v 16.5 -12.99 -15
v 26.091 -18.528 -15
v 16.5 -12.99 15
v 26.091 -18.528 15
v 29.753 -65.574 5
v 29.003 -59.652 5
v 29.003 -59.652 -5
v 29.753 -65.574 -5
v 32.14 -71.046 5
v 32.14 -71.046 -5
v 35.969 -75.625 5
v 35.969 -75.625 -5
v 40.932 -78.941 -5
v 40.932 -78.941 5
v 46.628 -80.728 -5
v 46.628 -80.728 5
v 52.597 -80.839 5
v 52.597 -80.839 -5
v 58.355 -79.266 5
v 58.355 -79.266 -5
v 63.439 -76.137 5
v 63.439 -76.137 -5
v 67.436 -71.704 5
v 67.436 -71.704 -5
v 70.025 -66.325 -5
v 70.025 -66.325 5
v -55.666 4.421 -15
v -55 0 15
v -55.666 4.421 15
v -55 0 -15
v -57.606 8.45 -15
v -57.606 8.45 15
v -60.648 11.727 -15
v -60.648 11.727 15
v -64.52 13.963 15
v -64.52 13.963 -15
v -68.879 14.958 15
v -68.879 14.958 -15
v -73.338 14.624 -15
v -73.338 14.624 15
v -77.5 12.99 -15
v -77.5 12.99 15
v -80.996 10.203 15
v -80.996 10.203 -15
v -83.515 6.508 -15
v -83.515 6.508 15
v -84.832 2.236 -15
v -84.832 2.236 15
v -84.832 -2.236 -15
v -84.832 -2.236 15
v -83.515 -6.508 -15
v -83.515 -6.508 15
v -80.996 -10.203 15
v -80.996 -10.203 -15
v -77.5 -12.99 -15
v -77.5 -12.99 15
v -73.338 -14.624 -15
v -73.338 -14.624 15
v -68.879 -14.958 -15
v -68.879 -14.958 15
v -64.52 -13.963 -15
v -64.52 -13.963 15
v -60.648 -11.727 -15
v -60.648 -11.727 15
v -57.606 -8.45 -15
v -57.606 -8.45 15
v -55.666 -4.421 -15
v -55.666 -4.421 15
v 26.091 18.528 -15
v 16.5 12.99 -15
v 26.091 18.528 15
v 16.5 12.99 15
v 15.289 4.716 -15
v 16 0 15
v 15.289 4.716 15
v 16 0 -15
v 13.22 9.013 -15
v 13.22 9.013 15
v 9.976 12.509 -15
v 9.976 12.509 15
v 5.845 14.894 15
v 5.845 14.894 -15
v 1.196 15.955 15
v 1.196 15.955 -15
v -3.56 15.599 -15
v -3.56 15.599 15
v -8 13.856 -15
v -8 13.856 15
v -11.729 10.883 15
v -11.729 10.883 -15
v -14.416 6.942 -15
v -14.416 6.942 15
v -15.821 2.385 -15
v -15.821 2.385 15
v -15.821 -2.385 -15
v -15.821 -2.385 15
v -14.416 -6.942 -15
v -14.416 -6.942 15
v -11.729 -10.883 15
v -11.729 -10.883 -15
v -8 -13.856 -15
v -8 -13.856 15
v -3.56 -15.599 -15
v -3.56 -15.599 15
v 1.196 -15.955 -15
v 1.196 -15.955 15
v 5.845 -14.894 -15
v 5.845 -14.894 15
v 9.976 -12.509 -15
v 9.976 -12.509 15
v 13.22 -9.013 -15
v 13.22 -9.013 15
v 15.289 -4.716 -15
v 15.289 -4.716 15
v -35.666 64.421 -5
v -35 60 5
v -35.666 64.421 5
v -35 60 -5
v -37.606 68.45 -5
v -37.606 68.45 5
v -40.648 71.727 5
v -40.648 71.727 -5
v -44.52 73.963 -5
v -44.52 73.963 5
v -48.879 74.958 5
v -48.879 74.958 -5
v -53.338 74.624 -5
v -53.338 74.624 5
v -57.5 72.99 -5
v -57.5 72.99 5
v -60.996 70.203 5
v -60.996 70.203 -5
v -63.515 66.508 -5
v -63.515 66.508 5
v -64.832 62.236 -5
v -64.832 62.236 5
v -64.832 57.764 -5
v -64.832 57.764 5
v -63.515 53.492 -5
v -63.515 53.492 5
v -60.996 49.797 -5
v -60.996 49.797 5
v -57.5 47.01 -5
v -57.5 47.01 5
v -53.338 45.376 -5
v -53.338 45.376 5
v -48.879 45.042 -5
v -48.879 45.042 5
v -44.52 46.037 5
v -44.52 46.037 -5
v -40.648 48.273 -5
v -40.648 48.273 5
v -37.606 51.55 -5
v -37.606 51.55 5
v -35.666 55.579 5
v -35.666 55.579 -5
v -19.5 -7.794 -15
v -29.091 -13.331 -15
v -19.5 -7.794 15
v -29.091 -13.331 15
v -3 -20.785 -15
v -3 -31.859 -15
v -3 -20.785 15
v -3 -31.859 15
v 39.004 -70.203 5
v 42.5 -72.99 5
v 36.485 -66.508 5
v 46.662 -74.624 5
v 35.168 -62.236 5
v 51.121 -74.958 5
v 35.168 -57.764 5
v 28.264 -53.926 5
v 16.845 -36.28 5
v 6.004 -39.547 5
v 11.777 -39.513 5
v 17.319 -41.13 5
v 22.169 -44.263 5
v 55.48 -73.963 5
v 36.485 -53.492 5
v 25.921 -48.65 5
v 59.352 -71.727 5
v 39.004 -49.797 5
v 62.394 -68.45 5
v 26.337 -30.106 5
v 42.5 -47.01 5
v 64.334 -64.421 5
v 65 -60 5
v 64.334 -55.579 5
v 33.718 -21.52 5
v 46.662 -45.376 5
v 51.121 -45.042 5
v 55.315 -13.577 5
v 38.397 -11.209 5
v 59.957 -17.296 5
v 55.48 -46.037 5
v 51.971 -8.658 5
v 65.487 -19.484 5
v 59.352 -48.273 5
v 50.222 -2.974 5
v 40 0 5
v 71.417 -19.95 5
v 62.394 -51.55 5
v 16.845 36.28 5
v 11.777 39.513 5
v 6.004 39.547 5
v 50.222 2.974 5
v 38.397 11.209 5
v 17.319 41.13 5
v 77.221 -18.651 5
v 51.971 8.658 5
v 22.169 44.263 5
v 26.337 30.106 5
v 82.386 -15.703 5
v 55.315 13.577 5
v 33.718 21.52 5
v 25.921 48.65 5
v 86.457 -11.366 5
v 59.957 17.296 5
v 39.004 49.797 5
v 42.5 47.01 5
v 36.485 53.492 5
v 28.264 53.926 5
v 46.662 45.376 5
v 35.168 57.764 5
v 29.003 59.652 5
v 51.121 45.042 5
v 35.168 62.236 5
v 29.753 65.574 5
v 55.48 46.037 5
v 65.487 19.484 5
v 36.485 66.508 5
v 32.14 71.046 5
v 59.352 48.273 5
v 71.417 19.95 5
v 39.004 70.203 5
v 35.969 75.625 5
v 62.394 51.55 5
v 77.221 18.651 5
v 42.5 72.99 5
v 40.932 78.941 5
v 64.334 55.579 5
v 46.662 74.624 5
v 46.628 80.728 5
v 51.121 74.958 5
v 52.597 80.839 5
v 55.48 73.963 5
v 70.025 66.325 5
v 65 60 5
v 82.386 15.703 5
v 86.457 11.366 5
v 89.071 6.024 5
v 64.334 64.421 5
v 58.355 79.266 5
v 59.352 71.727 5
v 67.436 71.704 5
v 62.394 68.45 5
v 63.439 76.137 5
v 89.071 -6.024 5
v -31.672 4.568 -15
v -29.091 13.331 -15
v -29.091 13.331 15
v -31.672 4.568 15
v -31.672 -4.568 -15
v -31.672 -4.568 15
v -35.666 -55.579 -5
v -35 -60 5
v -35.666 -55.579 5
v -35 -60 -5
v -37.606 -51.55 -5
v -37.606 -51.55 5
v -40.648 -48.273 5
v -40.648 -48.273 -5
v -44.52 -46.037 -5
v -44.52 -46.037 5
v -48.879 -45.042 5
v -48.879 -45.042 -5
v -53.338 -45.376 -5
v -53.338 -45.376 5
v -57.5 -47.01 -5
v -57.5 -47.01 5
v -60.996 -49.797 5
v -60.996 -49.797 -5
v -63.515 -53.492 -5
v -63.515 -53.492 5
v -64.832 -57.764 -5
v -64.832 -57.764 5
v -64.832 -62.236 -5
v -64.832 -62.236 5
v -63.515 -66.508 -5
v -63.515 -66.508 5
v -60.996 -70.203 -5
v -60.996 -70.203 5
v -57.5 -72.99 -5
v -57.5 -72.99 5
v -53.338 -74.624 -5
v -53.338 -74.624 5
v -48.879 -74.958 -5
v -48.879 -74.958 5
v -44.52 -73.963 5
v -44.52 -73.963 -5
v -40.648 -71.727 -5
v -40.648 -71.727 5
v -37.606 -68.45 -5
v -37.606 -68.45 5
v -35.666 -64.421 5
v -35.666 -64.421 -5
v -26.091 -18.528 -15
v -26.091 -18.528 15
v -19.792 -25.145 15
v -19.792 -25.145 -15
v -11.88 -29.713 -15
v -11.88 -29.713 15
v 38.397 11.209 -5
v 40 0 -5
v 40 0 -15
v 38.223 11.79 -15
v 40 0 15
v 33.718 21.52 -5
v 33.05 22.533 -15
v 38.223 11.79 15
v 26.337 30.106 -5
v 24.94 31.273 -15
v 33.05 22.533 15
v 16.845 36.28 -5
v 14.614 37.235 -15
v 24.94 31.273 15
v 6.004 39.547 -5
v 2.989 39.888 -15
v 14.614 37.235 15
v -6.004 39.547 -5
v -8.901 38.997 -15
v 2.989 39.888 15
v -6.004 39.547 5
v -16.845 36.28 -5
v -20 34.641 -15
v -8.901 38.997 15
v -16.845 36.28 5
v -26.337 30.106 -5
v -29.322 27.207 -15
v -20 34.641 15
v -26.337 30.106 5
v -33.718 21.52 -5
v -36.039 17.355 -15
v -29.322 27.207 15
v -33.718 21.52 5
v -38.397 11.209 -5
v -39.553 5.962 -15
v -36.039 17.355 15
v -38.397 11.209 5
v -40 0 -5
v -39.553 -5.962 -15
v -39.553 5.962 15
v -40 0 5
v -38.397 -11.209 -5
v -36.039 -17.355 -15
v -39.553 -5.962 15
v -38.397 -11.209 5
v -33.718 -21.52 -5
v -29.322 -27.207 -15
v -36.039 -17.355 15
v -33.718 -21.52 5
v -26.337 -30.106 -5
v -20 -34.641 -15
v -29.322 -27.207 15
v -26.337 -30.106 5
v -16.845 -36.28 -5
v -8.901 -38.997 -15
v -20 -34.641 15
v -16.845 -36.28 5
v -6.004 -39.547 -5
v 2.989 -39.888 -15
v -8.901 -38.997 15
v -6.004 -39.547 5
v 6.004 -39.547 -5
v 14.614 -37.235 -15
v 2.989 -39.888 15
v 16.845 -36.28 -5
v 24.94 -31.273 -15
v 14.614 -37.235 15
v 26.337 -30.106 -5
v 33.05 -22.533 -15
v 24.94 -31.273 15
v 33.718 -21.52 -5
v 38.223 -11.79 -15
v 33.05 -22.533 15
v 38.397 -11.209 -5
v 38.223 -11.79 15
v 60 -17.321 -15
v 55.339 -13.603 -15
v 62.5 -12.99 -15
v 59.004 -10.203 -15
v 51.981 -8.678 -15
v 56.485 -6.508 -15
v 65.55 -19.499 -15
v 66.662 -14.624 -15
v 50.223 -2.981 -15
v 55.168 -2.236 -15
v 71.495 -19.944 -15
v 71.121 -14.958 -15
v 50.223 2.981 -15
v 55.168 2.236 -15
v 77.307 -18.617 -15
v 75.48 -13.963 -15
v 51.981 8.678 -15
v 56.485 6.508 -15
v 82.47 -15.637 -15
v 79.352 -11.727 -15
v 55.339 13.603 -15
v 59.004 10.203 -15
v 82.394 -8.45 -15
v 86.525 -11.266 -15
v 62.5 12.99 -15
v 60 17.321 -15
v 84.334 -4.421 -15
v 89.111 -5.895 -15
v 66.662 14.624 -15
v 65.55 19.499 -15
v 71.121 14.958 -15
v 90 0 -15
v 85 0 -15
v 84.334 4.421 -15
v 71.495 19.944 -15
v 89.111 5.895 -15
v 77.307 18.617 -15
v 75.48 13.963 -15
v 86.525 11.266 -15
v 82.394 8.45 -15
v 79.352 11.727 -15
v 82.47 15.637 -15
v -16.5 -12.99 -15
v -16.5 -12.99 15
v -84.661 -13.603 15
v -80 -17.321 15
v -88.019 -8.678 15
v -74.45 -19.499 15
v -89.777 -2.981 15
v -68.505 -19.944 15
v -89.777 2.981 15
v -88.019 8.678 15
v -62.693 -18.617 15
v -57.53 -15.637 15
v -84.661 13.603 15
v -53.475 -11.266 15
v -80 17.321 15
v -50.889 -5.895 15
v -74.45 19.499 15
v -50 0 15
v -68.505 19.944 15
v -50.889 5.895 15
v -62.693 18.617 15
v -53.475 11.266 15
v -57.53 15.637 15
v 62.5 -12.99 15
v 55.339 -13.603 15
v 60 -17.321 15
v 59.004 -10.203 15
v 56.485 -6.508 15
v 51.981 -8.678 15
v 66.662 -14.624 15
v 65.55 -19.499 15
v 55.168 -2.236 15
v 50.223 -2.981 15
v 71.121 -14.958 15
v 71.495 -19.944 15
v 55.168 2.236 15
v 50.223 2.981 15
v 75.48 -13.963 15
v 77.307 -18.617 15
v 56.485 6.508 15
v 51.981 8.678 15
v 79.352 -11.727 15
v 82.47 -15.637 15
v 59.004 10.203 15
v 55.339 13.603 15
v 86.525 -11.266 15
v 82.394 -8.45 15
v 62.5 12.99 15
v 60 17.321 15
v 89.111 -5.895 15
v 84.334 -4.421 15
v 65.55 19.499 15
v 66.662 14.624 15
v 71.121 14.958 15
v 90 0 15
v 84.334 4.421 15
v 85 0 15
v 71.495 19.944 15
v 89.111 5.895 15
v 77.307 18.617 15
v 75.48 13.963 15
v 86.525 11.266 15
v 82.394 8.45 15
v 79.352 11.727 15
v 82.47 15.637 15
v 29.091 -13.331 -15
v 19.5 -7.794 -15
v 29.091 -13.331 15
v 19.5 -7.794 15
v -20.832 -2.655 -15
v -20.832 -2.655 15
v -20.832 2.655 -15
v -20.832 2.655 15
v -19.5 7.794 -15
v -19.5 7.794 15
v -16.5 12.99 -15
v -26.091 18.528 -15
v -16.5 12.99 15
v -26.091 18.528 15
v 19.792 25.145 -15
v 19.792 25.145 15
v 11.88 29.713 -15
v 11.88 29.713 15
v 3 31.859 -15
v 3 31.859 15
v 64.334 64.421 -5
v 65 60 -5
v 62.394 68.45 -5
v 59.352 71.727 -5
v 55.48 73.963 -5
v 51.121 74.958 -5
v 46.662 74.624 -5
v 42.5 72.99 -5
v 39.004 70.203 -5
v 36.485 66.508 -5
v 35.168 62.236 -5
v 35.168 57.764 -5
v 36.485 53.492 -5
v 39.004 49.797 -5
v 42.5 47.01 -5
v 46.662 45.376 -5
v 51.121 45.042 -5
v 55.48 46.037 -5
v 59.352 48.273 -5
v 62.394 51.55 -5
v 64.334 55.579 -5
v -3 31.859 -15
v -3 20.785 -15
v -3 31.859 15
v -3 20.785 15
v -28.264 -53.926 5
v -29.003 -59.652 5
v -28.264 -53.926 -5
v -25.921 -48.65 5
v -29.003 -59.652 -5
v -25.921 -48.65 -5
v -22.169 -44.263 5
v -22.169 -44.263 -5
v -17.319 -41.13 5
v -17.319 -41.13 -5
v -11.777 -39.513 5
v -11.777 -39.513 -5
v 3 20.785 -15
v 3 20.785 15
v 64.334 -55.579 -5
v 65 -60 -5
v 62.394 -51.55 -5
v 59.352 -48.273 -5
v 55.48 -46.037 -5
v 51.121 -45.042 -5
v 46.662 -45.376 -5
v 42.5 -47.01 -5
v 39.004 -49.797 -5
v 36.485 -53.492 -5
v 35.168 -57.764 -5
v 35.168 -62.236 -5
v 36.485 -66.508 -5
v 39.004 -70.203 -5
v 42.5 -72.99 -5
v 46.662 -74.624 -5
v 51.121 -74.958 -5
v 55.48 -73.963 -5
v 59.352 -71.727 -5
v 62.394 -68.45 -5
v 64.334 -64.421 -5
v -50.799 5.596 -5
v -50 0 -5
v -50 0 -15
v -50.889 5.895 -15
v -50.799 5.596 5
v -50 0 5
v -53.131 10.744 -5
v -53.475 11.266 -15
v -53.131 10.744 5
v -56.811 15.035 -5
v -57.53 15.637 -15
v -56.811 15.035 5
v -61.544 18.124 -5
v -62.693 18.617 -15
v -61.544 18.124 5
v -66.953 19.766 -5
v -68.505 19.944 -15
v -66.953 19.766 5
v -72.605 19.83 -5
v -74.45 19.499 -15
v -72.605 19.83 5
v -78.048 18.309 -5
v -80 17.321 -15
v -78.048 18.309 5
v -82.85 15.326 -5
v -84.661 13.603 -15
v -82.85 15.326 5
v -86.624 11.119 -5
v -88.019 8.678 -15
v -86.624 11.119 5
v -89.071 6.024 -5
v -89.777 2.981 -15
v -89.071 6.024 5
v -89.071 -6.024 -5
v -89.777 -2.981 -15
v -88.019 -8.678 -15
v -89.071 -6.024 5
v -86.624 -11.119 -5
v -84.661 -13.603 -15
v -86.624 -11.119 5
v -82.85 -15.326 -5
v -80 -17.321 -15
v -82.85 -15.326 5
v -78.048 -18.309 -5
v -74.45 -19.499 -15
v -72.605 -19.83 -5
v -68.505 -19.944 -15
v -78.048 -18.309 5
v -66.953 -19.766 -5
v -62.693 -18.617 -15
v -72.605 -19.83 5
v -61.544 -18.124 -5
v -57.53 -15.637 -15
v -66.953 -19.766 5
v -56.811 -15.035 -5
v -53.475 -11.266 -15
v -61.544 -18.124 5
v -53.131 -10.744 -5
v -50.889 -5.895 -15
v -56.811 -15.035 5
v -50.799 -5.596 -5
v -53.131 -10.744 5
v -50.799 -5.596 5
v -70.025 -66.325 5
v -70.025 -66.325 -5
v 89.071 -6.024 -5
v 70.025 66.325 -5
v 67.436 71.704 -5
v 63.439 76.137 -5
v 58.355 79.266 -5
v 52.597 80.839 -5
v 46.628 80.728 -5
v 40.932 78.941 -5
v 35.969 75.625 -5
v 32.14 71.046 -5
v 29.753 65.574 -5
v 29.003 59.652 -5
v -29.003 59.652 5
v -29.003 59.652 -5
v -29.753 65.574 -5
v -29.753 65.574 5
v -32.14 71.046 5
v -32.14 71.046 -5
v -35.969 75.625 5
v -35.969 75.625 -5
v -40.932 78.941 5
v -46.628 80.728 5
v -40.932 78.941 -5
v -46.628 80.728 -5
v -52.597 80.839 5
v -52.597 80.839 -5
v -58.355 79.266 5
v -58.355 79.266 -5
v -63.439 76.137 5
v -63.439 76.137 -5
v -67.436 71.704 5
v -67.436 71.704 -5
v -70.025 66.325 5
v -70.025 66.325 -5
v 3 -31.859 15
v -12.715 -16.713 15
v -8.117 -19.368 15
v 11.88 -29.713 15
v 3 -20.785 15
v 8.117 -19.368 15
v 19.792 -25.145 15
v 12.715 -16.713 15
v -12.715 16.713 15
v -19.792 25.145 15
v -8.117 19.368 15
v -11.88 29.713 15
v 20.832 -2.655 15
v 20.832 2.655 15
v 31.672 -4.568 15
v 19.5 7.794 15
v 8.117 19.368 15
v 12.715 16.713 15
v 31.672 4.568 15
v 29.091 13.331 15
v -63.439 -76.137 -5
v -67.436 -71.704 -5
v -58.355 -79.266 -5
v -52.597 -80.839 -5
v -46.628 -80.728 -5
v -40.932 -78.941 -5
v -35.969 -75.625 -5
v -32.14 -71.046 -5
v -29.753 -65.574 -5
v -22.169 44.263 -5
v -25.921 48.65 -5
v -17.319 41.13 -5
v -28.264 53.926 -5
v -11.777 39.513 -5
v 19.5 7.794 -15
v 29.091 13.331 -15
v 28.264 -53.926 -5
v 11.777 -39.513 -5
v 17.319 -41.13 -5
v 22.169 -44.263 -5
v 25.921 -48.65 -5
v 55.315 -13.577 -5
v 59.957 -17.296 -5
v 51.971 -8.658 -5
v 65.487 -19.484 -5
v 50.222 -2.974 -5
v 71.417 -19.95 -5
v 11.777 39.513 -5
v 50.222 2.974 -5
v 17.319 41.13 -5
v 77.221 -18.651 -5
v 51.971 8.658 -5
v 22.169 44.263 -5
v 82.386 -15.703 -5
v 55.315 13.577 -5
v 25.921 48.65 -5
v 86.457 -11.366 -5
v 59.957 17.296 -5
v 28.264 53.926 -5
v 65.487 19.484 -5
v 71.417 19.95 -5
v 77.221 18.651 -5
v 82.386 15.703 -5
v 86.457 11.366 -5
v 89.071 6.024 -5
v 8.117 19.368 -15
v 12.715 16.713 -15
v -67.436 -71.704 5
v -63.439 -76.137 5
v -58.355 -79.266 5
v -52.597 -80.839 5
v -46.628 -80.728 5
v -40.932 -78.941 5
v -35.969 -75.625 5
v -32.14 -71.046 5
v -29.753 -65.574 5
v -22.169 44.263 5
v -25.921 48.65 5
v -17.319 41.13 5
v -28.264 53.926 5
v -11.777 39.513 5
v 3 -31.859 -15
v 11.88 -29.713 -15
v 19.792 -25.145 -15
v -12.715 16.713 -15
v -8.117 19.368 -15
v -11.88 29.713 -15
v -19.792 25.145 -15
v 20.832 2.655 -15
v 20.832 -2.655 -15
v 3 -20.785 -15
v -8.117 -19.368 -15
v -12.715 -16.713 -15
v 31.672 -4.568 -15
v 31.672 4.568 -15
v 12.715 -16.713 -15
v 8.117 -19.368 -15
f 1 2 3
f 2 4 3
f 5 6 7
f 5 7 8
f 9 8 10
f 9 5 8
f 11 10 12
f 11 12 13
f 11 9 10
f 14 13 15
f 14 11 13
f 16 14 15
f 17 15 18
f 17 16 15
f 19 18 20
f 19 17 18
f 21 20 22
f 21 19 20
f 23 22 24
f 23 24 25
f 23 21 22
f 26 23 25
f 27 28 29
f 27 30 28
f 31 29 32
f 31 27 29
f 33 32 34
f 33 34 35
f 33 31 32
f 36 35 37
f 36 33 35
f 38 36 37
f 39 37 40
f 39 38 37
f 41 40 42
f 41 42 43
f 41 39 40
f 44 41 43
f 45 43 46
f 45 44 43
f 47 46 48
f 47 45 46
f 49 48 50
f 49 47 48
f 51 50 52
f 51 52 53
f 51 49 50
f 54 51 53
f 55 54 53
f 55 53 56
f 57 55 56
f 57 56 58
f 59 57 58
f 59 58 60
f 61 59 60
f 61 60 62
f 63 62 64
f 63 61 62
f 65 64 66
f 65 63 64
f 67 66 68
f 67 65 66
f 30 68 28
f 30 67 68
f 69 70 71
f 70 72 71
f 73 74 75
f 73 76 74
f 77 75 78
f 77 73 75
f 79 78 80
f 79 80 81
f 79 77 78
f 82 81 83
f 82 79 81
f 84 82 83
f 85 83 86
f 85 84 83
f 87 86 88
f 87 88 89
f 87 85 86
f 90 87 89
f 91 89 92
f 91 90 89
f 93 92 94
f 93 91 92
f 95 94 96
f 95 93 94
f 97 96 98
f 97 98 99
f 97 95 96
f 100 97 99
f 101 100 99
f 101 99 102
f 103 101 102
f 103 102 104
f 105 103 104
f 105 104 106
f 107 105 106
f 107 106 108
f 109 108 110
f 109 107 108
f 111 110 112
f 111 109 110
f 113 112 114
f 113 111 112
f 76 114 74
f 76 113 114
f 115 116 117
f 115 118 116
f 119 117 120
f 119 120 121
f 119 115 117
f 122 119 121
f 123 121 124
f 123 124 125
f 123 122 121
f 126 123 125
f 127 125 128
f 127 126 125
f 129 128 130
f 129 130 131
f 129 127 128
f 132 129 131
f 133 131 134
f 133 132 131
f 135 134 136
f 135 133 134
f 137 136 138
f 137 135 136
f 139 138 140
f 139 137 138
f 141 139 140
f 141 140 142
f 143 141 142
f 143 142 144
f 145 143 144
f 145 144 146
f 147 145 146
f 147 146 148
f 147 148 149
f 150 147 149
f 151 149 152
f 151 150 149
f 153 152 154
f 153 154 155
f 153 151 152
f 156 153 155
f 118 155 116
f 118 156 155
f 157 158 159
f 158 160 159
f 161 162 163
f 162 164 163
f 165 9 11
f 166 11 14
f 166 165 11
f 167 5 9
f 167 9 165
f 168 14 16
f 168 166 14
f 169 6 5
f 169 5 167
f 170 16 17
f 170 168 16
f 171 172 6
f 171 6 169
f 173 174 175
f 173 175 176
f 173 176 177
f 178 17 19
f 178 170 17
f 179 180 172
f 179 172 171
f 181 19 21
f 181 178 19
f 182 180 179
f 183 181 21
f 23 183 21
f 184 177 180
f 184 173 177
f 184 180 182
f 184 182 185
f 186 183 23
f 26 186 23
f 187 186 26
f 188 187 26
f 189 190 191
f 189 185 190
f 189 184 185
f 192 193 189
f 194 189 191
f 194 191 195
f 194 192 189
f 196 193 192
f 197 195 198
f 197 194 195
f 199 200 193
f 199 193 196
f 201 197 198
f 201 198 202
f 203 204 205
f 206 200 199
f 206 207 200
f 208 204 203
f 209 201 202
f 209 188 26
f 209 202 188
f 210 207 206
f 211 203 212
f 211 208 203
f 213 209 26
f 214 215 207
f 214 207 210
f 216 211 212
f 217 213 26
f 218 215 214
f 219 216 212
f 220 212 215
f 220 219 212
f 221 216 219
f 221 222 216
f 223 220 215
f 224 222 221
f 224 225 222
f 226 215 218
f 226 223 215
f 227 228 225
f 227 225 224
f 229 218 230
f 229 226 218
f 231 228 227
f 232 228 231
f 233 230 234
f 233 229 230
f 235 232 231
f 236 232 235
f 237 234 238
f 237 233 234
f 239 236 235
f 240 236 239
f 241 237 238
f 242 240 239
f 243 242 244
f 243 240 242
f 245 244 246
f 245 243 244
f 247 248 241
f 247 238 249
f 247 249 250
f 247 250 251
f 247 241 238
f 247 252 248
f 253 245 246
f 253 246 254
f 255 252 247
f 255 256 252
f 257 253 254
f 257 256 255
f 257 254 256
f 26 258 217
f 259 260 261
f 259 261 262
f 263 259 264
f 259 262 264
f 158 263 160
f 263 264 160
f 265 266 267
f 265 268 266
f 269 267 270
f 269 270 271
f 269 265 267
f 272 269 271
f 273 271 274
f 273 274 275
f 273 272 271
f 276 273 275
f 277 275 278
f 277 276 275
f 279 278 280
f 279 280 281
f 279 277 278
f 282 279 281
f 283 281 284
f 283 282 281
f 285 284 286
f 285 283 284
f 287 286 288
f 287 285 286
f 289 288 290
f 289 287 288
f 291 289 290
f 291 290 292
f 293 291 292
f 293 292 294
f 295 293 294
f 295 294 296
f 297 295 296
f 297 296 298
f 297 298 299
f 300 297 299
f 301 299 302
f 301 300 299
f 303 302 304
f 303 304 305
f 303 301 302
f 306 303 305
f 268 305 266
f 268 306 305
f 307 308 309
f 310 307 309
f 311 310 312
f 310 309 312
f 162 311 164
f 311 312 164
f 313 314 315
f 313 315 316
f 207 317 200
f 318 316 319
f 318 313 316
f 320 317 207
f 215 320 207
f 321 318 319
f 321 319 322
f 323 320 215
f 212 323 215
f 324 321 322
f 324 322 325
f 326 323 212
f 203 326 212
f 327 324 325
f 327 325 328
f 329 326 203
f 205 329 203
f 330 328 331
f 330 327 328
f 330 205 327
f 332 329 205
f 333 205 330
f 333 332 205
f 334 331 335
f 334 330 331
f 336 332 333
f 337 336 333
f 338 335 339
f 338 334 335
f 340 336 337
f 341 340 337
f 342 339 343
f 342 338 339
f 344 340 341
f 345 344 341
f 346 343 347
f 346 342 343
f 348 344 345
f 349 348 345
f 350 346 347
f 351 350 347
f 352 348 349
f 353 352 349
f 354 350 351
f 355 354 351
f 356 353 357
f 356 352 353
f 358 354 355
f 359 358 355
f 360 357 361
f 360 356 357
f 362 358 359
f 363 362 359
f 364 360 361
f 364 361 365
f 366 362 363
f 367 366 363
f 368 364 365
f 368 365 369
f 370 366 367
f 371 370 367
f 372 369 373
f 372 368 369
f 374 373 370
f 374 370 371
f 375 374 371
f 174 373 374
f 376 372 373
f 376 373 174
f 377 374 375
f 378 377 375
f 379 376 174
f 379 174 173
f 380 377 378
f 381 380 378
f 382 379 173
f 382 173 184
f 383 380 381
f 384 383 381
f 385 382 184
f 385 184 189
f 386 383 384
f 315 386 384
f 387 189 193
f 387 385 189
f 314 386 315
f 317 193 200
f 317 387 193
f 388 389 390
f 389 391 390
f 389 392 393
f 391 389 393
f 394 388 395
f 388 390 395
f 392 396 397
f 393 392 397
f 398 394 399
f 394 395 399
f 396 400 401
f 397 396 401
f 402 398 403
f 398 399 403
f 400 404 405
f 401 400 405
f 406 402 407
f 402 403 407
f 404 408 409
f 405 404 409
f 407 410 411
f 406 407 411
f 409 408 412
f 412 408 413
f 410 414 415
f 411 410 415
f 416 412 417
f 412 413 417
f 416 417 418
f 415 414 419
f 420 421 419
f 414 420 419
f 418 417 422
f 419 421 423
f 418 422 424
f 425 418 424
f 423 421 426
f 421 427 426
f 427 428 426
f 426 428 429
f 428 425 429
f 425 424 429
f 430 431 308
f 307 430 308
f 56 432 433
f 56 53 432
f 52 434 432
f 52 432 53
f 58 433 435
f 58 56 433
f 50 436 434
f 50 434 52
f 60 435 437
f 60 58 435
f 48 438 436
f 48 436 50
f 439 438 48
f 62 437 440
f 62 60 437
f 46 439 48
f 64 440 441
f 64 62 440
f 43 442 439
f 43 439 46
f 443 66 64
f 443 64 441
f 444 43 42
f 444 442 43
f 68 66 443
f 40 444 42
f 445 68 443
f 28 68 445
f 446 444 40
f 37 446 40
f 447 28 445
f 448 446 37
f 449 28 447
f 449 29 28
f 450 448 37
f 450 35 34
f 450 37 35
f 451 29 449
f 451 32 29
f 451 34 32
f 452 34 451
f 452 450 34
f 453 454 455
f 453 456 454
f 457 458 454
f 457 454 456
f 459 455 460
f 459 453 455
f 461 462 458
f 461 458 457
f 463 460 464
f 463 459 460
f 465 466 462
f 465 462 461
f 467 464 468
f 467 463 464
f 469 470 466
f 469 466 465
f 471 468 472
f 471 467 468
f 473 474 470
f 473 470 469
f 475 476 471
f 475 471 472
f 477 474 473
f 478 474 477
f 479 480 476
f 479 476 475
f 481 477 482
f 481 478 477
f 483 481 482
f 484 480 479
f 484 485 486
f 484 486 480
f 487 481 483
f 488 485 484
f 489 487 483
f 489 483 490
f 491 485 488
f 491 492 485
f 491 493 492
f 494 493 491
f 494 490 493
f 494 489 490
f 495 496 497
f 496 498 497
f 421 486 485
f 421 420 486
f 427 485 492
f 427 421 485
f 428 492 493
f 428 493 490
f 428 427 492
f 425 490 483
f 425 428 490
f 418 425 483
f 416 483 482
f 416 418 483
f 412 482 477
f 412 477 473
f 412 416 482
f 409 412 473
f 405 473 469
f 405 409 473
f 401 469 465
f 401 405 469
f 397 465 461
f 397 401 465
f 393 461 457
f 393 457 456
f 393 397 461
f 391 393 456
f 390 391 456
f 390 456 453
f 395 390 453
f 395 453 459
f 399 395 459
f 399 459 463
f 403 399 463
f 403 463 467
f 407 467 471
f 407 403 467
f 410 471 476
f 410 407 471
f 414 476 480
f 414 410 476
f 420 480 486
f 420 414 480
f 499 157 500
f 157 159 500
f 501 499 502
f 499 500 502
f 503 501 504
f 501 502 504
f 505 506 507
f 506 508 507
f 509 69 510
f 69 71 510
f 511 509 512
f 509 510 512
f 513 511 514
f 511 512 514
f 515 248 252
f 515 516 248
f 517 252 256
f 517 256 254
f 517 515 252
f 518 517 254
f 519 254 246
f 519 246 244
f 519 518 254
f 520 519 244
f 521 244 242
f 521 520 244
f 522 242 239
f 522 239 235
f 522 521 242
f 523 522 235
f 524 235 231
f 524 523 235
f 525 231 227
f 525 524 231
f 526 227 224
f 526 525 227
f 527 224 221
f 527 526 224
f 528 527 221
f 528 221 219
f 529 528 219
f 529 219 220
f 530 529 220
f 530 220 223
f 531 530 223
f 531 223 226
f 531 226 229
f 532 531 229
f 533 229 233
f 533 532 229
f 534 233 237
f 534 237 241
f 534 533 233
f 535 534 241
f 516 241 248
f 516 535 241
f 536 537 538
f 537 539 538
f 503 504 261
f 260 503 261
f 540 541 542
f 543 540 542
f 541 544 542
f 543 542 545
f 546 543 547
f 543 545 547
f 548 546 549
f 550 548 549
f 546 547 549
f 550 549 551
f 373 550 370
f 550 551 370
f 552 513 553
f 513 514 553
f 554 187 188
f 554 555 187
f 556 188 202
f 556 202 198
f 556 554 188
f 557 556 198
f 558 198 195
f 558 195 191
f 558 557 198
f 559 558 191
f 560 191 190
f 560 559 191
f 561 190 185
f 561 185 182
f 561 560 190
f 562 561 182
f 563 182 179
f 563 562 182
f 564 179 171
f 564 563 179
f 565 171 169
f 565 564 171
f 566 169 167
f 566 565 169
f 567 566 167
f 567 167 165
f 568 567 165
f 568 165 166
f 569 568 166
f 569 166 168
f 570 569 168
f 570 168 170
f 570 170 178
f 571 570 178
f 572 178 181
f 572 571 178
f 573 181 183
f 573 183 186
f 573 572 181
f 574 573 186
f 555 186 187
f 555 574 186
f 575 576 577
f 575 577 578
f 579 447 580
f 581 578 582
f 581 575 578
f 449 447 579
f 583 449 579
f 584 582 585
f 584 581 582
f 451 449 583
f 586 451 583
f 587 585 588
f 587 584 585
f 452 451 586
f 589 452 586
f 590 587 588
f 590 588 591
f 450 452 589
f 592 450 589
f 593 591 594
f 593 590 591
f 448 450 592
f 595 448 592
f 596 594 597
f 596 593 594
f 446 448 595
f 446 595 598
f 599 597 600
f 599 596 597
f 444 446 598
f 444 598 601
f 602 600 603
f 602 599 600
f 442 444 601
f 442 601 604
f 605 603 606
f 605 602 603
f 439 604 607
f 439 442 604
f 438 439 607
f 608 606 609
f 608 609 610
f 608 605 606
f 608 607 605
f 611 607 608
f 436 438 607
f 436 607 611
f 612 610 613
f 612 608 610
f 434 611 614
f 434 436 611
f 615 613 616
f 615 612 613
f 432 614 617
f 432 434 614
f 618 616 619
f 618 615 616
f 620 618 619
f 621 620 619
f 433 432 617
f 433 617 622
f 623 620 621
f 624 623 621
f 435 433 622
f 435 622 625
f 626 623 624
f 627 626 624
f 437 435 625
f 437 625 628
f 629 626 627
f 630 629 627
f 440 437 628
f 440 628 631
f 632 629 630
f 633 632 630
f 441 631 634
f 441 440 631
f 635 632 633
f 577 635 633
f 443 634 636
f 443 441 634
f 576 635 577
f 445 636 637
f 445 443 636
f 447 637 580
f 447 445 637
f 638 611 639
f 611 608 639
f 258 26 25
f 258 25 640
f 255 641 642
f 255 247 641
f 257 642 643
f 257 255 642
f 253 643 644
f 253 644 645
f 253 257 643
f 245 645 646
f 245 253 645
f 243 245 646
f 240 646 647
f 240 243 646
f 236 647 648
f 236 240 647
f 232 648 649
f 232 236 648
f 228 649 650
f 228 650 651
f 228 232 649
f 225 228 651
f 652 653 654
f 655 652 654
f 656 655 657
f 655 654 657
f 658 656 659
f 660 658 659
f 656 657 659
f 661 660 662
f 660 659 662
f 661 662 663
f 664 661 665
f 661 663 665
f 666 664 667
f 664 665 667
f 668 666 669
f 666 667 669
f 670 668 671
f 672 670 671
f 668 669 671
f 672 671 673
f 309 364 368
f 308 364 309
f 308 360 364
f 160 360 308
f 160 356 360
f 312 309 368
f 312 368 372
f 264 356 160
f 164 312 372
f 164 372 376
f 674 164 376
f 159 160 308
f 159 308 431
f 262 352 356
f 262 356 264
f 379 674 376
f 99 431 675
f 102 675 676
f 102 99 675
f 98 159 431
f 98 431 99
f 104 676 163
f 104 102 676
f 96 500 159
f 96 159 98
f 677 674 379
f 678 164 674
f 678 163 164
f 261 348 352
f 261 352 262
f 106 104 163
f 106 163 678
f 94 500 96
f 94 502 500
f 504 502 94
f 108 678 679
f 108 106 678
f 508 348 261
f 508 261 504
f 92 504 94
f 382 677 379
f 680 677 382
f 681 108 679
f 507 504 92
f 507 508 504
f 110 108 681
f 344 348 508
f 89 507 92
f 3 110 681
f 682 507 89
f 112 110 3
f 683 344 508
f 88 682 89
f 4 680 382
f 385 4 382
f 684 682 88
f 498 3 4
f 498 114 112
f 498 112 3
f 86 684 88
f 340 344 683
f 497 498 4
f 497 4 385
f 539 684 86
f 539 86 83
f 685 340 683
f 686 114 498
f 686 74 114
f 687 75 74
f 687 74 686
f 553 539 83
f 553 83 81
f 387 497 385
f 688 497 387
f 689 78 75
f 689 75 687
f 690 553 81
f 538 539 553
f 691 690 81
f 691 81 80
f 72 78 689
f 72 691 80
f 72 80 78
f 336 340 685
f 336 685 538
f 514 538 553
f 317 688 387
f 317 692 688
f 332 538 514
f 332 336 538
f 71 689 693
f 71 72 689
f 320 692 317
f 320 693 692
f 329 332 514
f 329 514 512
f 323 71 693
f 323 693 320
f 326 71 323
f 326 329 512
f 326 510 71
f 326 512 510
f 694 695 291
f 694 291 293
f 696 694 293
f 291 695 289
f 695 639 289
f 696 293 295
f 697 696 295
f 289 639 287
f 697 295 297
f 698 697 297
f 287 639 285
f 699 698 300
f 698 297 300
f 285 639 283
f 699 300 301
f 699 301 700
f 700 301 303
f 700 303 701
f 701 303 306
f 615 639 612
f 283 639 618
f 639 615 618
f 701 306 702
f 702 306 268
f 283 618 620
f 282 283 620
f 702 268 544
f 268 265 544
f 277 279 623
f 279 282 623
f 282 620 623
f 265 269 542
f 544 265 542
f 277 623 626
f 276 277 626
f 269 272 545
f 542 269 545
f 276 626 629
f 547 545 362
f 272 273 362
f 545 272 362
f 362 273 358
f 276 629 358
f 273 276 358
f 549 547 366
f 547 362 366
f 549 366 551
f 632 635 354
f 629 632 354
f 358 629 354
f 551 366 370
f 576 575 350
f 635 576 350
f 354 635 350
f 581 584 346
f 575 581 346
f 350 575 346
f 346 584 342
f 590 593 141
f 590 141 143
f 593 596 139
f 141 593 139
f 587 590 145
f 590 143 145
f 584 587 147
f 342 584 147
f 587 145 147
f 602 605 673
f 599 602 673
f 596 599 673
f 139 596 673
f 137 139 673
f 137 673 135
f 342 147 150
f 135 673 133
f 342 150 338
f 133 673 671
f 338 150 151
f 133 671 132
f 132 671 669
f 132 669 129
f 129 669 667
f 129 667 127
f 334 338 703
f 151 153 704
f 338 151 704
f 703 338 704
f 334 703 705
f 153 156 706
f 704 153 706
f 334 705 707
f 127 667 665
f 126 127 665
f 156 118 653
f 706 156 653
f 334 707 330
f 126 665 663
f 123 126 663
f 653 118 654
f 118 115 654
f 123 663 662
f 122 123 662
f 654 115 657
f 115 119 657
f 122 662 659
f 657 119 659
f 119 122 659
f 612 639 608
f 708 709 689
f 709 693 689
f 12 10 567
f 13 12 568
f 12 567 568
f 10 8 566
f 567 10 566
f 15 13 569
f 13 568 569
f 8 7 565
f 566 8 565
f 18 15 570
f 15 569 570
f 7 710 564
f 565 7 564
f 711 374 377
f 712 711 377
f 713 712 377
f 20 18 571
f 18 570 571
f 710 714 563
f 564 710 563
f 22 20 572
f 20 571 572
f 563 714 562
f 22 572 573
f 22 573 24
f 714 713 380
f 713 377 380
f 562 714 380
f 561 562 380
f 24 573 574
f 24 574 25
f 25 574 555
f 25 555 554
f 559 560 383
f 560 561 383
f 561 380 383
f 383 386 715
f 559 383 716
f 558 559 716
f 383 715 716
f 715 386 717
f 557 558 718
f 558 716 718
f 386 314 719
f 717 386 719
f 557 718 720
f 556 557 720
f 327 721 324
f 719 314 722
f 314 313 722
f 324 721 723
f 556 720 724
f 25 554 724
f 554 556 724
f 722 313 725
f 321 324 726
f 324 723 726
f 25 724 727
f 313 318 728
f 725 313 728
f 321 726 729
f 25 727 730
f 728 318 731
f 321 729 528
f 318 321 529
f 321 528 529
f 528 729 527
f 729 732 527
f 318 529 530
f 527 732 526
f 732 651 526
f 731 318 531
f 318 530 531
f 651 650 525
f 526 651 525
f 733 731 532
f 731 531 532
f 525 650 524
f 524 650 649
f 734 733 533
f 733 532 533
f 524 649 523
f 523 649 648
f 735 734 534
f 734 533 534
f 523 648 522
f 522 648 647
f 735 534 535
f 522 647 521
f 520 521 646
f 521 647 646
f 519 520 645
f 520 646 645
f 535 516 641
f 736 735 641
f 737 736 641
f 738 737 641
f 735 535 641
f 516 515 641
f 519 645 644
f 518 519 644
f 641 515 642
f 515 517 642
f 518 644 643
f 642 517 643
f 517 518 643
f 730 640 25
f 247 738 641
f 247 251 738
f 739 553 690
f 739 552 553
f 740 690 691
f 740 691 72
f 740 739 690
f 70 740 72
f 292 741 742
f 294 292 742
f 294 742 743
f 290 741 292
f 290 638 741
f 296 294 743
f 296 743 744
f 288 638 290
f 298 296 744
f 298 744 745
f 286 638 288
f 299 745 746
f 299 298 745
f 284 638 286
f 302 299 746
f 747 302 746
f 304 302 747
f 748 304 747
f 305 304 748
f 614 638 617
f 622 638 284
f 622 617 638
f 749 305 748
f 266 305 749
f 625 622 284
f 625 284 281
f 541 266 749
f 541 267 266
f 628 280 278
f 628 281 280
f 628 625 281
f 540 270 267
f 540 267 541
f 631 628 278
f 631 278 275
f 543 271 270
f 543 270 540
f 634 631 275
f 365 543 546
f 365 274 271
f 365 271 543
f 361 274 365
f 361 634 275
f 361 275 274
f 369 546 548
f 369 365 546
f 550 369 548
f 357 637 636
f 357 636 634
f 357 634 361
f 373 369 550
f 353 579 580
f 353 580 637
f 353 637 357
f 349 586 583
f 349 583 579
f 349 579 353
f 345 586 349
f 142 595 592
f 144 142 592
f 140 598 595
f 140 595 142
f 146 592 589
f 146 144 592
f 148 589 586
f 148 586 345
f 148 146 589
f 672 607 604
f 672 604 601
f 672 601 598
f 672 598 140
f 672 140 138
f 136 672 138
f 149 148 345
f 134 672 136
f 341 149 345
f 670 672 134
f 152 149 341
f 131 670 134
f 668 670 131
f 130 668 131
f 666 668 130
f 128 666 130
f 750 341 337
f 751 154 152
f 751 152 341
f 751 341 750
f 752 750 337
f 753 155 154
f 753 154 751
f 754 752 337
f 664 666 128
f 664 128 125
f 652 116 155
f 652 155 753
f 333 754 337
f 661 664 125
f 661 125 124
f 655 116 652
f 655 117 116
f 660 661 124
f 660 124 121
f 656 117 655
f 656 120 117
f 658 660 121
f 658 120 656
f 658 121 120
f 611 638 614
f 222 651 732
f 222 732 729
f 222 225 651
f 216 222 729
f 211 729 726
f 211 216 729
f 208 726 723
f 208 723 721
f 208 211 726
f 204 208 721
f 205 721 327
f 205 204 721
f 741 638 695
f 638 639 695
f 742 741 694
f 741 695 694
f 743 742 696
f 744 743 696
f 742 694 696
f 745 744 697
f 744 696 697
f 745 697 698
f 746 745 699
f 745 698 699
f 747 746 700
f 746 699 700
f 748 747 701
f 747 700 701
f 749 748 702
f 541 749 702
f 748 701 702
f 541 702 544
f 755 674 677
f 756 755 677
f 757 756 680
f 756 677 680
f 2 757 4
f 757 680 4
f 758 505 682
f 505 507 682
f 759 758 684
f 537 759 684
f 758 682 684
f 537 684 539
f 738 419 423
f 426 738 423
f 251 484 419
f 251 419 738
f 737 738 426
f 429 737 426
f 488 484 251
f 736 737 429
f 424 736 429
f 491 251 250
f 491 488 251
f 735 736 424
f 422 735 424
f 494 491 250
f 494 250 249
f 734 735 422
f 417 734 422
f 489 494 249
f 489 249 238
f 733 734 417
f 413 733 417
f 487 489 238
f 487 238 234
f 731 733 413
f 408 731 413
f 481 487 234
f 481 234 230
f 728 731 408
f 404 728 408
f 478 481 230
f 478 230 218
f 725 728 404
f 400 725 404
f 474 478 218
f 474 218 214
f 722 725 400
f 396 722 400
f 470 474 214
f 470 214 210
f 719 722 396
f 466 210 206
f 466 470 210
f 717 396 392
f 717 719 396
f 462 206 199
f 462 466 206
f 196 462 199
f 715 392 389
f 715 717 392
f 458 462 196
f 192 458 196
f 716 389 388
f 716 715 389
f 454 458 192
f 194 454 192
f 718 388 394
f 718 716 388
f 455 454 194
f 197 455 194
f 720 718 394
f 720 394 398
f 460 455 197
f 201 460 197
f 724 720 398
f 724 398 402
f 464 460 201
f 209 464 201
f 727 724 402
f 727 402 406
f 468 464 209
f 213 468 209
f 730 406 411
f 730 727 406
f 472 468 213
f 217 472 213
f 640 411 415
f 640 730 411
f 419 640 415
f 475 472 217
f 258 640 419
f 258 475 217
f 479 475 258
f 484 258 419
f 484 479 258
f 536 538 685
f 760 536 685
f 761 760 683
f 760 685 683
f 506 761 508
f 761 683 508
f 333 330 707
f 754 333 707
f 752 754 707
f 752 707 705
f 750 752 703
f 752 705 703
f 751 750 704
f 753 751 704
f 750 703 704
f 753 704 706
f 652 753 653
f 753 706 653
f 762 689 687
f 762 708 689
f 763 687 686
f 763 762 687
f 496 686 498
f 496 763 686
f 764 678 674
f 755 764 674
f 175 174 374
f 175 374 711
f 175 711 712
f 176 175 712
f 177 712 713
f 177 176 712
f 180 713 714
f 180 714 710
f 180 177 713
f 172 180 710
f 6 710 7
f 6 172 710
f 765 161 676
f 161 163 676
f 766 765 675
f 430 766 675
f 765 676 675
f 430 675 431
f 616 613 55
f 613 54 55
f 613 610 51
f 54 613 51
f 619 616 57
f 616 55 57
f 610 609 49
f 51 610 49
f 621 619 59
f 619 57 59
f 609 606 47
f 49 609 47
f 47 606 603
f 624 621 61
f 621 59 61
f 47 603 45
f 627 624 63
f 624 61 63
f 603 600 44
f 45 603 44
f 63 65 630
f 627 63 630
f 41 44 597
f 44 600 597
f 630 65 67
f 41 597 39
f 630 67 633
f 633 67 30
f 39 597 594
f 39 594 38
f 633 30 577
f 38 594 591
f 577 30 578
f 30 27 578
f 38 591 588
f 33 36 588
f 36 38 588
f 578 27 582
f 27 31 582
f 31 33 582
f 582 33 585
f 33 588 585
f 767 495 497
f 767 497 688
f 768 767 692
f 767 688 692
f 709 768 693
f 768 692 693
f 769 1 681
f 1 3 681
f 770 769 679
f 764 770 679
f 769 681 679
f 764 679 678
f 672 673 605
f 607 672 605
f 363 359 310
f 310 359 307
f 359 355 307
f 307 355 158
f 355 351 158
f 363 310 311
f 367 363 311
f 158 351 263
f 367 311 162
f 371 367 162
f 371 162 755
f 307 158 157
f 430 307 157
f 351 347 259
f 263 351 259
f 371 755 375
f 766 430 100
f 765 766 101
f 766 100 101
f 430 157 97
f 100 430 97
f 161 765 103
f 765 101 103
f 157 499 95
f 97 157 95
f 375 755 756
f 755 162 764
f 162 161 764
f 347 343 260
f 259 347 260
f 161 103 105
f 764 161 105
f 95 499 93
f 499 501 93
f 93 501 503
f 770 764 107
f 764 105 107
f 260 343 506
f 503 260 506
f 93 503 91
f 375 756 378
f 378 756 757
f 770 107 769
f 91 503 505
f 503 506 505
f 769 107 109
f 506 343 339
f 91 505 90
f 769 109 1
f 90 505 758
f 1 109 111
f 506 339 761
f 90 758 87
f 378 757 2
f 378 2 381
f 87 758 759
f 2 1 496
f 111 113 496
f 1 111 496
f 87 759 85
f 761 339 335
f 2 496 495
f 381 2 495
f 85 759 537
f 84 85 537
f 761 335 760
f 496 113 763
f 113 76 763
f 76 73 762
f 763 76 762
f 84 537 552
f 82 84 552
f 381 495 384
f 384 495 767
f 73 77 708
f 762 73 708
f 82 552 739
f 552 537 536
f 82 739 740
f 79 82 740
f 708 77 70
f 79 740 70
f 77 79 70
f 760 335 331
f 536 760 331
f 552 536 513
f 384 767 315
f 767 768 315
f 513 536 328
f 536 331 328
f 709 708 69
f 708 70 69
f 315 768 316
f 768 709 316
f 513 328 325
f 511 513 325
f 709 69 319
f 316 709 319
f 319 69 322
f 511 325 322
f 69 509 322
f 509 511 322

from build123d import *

# Parameters (mm, degrees)
SKETCH1_R             = 20
SKETCH1_R_2           = 15
BOSS_EXTRUDE1_DEPTH   = 15
SKETCH1_R_3           = 40
SKETCH1_R_4           = 16
BOSS_EXTRUDE1_2_DEPTH = 15
BOSS_EXTRUDE1_3_DEPTH = 15
SKETCH1_3_R           = 15
BOSS_EXTRUDE2_DEPTH   = 5


with BuildPart() as part:
    # Sketch1 → Boss-Extrude1 (new, symmetric)
    with BuildSketch(Plane.XY):
        with Locations((-70, 0)):
            Circle(SKETCH1_R)
        with Locations((-70, 0)):
            Circle(SKETCH1_R_2, mode=Mode.SUBTRACT)
    extrude(amount=BOSS_EXTRUDE1_DEPTH, both=True)



with BuildPart() as body_2:
    # Sketch1 → Boss-Extrude1 2 (new, symmetric)
    with BuildSketch(Plane.XY):
        Circle(SKETCH1_R_3)
        with BuildLine():
            Line((-3, -20.784609691), (-3, -31.859064644))
            ThreePointArc((-3, -31.859064644), (-16, -27.712812921), (-26.090759323, -18.527608533))
            Line((-26.090759323, -18.527608533), (-16.5, -12.990381057))
            ThreePointArc((-16.5, -12.990381057), (-10.5, -18.186533479), (-3, -20.784609691))
        make_face(mode=Mode.SUBTRACT)
        with BuildLine():
            Line((-19.5, -7.794228634), (-29.090759323, -13.331456111))
            ThreePointArc((-29.090759323, -13.331456111), (-32, 0), (-29.090759323, 13.331456111))
            Line((-29.090759323, 13.331456111), (-19.5, 7.794228634))
            ThreePointArc((-19.5, 7.794228634), (-21, 0), (-19.5, -7.794228634))
        make_face(mode=Mode.SUBTRACT)
        with BuildLine():
            Line((16.5, -12.990381057), (26.090759323, -18.527608533))
            ThreePointArc((26.090759323, -18.527608533), (16, -27.712812921), (3, -31.859064644))
            Line((3, -31.859064644), (3, -20.784609691))
            ThreePointArc((3, -20.784609691), (10.5, -18.186533479), (16.5, -12.990381057))
        make_face(mode=Mode.SUBTRACT)
        with BuildLine():
            ThreePointArc((-26.090759323, 18.527608533), (-16, 27.712812921), (-3, 31.859064644))
            Line((-3, 31.859064644), (-3, 20.784609691))
            ThreePointArc((-3, 20.784609691), (-10.5, 18.186533479), (-16.5, 12.990381057))
            Line((-16.5, 12.990381057), (-26.090759323, 18.527608533))
        make_face(mode=Mode.SUBTRACT)
        Circle(SKETCH1_R_4, mode=Mode.SUBTRACT)
        with BuildLine():
            Line((19.5, 7.794228634), (29.090759323, 13.331456111))
            ThreePointArc((29.090759323, 13.331456111), (32, 0), (29.090759323, -13.331456111))
            Line((29.090759323, -13.331456111), (19.5, -7.794228634))
            ThreePointArc((19.5, -7.794228634), (21, 0), (19.5, 7.794228634))
        make_face(mode=Mode.SUBTRACT)
        with BuildLine():
            Line((3, 20.784609691), (3, 31.859064644))
            ThreePointArc((3, 31.859064644), (16, 27.712812921), (26.090759323, 18.527608533))
            Line((26.090759323, 18.527608533), (16.5, 12.990381057))
            ThreePointArc((16.5, 12.990381057), (10.5, 18.186533479), (3, 20.784609691))
        make_face(mode=Mode.SUBTRACT)
    extrude(amount=BOSS_EXTRUDE1_2_DEPTH, both=True)


with BuildPart() as body_3:
    # Sketch1 → Boss-Extrude1 3 (new, symmetric)
    with BuildSketch(Plane.XY):
        with Locations((70, 0)):
            Circle(SKETCH1_R)
        with Locations((70, 0)):
            Circle(SKETCH1_R_2, mode=Mode.SUBTRACT)
    extrude(amount=BOSS_EXTRUDE1_3_DEPTH, both=True)


with BuildPart() as part_1:
    add(part.part)

    add(body_2.part)  # Boss-Extrude2 merges body 2

    add(body_3.part)  # Boss-Extrude2 merges body 3
    # Sketch1<3> → Boss-Extrude2 (add, symmetric)
    # profile 1 of 2: a face of its own
    with BuildSketch(Plane.XY):
        with BuildLine():
            ThreePointArc((-89.071294105, 6.023764702), (-50, 0), (-89.071294105, -6.023764702))
            Line((-89.071294105, -6.023764702), (-70.02485881, -66.324952937))
            ThreePointArc((-70.02485881, -66.324952937), (-46.6282273, -80.727545655), (-29.002885891, -59.651863383))
            ThreePointArc((-29.002885891, -59.651863383), (-22.168588856, -44.262528341), (-6.003756239, -39.546869801))
            ThreePointArc((-6.003756239, -39.546869801), (-40, 0), (-6.003756239, 39.546869801))
            ThreePointArc((-6.003756239, 39.546869801), (-22.168588856, 44.262528341), (-29.002885891, 59.651863383))
            ThreePointArc((-29.002885891, 59.651863383), (-46.6282273, 80.727545655), (-70.02485881, 66.324952937))
            Line((-70.02485881, 66.324952937), (-89.071294105, 6.023764702))
        make_face()
        with Locations((-50, -60)):
            Circle(SKETCH1_3_R, mode=Mode.SUBTRACT)
        with Locations((-50, 60)):
            Circle(SKETCH1_3_R, mode=Mode.SUBTRACT)
    # profile 2 of 2: a face of its own
    with BuildSketch(Plane.XY):
        with BuildLine():
            ThreePointArc((6.003756239, 39.546869801), (40, 0), (6.003756239, -39.546869801))
            ThreePointArc((6.003756239, -39.546869801), (22.168588856, -44.262528341), (29.002885891, -59.651863383))
            ThreePointArc((29.002885891, -59.651863383), (46.6282273, -80.727545655), (70.02485881, -66.324952937))
            Line((70.02485881, -66.324952937), (89.071294105, -6.023764702))
            ThreePointArc((89.071294105, -6.023764702), (50, 0), (89.071294105, 6.023764702))
            Line((89.071294105, 6.023764702), (70.02485881, 66.324952937))
            ThreePointArc((70.02485881, 66.324952937), (46.6282273, 80.727545655), (29.002885891, 59.651863383))
            ThreePointArc((29.002885891, 59.651863383), (22.168588856, 44.262528341), (6.003756239, 39.546869801))
        make_face()
        with Locations((50, -60)):
            Circle(SKETCH1_3_R, mode=Mode.SUBTRACT)
        with Locations((50, 60)):
            Circle(SKETCH1_3_R, mode=Mode.SUBTRACT)
    extrude(amount=BOSS_EXTRUDE2_DEPTH, both=True)


solid = part_1.part
